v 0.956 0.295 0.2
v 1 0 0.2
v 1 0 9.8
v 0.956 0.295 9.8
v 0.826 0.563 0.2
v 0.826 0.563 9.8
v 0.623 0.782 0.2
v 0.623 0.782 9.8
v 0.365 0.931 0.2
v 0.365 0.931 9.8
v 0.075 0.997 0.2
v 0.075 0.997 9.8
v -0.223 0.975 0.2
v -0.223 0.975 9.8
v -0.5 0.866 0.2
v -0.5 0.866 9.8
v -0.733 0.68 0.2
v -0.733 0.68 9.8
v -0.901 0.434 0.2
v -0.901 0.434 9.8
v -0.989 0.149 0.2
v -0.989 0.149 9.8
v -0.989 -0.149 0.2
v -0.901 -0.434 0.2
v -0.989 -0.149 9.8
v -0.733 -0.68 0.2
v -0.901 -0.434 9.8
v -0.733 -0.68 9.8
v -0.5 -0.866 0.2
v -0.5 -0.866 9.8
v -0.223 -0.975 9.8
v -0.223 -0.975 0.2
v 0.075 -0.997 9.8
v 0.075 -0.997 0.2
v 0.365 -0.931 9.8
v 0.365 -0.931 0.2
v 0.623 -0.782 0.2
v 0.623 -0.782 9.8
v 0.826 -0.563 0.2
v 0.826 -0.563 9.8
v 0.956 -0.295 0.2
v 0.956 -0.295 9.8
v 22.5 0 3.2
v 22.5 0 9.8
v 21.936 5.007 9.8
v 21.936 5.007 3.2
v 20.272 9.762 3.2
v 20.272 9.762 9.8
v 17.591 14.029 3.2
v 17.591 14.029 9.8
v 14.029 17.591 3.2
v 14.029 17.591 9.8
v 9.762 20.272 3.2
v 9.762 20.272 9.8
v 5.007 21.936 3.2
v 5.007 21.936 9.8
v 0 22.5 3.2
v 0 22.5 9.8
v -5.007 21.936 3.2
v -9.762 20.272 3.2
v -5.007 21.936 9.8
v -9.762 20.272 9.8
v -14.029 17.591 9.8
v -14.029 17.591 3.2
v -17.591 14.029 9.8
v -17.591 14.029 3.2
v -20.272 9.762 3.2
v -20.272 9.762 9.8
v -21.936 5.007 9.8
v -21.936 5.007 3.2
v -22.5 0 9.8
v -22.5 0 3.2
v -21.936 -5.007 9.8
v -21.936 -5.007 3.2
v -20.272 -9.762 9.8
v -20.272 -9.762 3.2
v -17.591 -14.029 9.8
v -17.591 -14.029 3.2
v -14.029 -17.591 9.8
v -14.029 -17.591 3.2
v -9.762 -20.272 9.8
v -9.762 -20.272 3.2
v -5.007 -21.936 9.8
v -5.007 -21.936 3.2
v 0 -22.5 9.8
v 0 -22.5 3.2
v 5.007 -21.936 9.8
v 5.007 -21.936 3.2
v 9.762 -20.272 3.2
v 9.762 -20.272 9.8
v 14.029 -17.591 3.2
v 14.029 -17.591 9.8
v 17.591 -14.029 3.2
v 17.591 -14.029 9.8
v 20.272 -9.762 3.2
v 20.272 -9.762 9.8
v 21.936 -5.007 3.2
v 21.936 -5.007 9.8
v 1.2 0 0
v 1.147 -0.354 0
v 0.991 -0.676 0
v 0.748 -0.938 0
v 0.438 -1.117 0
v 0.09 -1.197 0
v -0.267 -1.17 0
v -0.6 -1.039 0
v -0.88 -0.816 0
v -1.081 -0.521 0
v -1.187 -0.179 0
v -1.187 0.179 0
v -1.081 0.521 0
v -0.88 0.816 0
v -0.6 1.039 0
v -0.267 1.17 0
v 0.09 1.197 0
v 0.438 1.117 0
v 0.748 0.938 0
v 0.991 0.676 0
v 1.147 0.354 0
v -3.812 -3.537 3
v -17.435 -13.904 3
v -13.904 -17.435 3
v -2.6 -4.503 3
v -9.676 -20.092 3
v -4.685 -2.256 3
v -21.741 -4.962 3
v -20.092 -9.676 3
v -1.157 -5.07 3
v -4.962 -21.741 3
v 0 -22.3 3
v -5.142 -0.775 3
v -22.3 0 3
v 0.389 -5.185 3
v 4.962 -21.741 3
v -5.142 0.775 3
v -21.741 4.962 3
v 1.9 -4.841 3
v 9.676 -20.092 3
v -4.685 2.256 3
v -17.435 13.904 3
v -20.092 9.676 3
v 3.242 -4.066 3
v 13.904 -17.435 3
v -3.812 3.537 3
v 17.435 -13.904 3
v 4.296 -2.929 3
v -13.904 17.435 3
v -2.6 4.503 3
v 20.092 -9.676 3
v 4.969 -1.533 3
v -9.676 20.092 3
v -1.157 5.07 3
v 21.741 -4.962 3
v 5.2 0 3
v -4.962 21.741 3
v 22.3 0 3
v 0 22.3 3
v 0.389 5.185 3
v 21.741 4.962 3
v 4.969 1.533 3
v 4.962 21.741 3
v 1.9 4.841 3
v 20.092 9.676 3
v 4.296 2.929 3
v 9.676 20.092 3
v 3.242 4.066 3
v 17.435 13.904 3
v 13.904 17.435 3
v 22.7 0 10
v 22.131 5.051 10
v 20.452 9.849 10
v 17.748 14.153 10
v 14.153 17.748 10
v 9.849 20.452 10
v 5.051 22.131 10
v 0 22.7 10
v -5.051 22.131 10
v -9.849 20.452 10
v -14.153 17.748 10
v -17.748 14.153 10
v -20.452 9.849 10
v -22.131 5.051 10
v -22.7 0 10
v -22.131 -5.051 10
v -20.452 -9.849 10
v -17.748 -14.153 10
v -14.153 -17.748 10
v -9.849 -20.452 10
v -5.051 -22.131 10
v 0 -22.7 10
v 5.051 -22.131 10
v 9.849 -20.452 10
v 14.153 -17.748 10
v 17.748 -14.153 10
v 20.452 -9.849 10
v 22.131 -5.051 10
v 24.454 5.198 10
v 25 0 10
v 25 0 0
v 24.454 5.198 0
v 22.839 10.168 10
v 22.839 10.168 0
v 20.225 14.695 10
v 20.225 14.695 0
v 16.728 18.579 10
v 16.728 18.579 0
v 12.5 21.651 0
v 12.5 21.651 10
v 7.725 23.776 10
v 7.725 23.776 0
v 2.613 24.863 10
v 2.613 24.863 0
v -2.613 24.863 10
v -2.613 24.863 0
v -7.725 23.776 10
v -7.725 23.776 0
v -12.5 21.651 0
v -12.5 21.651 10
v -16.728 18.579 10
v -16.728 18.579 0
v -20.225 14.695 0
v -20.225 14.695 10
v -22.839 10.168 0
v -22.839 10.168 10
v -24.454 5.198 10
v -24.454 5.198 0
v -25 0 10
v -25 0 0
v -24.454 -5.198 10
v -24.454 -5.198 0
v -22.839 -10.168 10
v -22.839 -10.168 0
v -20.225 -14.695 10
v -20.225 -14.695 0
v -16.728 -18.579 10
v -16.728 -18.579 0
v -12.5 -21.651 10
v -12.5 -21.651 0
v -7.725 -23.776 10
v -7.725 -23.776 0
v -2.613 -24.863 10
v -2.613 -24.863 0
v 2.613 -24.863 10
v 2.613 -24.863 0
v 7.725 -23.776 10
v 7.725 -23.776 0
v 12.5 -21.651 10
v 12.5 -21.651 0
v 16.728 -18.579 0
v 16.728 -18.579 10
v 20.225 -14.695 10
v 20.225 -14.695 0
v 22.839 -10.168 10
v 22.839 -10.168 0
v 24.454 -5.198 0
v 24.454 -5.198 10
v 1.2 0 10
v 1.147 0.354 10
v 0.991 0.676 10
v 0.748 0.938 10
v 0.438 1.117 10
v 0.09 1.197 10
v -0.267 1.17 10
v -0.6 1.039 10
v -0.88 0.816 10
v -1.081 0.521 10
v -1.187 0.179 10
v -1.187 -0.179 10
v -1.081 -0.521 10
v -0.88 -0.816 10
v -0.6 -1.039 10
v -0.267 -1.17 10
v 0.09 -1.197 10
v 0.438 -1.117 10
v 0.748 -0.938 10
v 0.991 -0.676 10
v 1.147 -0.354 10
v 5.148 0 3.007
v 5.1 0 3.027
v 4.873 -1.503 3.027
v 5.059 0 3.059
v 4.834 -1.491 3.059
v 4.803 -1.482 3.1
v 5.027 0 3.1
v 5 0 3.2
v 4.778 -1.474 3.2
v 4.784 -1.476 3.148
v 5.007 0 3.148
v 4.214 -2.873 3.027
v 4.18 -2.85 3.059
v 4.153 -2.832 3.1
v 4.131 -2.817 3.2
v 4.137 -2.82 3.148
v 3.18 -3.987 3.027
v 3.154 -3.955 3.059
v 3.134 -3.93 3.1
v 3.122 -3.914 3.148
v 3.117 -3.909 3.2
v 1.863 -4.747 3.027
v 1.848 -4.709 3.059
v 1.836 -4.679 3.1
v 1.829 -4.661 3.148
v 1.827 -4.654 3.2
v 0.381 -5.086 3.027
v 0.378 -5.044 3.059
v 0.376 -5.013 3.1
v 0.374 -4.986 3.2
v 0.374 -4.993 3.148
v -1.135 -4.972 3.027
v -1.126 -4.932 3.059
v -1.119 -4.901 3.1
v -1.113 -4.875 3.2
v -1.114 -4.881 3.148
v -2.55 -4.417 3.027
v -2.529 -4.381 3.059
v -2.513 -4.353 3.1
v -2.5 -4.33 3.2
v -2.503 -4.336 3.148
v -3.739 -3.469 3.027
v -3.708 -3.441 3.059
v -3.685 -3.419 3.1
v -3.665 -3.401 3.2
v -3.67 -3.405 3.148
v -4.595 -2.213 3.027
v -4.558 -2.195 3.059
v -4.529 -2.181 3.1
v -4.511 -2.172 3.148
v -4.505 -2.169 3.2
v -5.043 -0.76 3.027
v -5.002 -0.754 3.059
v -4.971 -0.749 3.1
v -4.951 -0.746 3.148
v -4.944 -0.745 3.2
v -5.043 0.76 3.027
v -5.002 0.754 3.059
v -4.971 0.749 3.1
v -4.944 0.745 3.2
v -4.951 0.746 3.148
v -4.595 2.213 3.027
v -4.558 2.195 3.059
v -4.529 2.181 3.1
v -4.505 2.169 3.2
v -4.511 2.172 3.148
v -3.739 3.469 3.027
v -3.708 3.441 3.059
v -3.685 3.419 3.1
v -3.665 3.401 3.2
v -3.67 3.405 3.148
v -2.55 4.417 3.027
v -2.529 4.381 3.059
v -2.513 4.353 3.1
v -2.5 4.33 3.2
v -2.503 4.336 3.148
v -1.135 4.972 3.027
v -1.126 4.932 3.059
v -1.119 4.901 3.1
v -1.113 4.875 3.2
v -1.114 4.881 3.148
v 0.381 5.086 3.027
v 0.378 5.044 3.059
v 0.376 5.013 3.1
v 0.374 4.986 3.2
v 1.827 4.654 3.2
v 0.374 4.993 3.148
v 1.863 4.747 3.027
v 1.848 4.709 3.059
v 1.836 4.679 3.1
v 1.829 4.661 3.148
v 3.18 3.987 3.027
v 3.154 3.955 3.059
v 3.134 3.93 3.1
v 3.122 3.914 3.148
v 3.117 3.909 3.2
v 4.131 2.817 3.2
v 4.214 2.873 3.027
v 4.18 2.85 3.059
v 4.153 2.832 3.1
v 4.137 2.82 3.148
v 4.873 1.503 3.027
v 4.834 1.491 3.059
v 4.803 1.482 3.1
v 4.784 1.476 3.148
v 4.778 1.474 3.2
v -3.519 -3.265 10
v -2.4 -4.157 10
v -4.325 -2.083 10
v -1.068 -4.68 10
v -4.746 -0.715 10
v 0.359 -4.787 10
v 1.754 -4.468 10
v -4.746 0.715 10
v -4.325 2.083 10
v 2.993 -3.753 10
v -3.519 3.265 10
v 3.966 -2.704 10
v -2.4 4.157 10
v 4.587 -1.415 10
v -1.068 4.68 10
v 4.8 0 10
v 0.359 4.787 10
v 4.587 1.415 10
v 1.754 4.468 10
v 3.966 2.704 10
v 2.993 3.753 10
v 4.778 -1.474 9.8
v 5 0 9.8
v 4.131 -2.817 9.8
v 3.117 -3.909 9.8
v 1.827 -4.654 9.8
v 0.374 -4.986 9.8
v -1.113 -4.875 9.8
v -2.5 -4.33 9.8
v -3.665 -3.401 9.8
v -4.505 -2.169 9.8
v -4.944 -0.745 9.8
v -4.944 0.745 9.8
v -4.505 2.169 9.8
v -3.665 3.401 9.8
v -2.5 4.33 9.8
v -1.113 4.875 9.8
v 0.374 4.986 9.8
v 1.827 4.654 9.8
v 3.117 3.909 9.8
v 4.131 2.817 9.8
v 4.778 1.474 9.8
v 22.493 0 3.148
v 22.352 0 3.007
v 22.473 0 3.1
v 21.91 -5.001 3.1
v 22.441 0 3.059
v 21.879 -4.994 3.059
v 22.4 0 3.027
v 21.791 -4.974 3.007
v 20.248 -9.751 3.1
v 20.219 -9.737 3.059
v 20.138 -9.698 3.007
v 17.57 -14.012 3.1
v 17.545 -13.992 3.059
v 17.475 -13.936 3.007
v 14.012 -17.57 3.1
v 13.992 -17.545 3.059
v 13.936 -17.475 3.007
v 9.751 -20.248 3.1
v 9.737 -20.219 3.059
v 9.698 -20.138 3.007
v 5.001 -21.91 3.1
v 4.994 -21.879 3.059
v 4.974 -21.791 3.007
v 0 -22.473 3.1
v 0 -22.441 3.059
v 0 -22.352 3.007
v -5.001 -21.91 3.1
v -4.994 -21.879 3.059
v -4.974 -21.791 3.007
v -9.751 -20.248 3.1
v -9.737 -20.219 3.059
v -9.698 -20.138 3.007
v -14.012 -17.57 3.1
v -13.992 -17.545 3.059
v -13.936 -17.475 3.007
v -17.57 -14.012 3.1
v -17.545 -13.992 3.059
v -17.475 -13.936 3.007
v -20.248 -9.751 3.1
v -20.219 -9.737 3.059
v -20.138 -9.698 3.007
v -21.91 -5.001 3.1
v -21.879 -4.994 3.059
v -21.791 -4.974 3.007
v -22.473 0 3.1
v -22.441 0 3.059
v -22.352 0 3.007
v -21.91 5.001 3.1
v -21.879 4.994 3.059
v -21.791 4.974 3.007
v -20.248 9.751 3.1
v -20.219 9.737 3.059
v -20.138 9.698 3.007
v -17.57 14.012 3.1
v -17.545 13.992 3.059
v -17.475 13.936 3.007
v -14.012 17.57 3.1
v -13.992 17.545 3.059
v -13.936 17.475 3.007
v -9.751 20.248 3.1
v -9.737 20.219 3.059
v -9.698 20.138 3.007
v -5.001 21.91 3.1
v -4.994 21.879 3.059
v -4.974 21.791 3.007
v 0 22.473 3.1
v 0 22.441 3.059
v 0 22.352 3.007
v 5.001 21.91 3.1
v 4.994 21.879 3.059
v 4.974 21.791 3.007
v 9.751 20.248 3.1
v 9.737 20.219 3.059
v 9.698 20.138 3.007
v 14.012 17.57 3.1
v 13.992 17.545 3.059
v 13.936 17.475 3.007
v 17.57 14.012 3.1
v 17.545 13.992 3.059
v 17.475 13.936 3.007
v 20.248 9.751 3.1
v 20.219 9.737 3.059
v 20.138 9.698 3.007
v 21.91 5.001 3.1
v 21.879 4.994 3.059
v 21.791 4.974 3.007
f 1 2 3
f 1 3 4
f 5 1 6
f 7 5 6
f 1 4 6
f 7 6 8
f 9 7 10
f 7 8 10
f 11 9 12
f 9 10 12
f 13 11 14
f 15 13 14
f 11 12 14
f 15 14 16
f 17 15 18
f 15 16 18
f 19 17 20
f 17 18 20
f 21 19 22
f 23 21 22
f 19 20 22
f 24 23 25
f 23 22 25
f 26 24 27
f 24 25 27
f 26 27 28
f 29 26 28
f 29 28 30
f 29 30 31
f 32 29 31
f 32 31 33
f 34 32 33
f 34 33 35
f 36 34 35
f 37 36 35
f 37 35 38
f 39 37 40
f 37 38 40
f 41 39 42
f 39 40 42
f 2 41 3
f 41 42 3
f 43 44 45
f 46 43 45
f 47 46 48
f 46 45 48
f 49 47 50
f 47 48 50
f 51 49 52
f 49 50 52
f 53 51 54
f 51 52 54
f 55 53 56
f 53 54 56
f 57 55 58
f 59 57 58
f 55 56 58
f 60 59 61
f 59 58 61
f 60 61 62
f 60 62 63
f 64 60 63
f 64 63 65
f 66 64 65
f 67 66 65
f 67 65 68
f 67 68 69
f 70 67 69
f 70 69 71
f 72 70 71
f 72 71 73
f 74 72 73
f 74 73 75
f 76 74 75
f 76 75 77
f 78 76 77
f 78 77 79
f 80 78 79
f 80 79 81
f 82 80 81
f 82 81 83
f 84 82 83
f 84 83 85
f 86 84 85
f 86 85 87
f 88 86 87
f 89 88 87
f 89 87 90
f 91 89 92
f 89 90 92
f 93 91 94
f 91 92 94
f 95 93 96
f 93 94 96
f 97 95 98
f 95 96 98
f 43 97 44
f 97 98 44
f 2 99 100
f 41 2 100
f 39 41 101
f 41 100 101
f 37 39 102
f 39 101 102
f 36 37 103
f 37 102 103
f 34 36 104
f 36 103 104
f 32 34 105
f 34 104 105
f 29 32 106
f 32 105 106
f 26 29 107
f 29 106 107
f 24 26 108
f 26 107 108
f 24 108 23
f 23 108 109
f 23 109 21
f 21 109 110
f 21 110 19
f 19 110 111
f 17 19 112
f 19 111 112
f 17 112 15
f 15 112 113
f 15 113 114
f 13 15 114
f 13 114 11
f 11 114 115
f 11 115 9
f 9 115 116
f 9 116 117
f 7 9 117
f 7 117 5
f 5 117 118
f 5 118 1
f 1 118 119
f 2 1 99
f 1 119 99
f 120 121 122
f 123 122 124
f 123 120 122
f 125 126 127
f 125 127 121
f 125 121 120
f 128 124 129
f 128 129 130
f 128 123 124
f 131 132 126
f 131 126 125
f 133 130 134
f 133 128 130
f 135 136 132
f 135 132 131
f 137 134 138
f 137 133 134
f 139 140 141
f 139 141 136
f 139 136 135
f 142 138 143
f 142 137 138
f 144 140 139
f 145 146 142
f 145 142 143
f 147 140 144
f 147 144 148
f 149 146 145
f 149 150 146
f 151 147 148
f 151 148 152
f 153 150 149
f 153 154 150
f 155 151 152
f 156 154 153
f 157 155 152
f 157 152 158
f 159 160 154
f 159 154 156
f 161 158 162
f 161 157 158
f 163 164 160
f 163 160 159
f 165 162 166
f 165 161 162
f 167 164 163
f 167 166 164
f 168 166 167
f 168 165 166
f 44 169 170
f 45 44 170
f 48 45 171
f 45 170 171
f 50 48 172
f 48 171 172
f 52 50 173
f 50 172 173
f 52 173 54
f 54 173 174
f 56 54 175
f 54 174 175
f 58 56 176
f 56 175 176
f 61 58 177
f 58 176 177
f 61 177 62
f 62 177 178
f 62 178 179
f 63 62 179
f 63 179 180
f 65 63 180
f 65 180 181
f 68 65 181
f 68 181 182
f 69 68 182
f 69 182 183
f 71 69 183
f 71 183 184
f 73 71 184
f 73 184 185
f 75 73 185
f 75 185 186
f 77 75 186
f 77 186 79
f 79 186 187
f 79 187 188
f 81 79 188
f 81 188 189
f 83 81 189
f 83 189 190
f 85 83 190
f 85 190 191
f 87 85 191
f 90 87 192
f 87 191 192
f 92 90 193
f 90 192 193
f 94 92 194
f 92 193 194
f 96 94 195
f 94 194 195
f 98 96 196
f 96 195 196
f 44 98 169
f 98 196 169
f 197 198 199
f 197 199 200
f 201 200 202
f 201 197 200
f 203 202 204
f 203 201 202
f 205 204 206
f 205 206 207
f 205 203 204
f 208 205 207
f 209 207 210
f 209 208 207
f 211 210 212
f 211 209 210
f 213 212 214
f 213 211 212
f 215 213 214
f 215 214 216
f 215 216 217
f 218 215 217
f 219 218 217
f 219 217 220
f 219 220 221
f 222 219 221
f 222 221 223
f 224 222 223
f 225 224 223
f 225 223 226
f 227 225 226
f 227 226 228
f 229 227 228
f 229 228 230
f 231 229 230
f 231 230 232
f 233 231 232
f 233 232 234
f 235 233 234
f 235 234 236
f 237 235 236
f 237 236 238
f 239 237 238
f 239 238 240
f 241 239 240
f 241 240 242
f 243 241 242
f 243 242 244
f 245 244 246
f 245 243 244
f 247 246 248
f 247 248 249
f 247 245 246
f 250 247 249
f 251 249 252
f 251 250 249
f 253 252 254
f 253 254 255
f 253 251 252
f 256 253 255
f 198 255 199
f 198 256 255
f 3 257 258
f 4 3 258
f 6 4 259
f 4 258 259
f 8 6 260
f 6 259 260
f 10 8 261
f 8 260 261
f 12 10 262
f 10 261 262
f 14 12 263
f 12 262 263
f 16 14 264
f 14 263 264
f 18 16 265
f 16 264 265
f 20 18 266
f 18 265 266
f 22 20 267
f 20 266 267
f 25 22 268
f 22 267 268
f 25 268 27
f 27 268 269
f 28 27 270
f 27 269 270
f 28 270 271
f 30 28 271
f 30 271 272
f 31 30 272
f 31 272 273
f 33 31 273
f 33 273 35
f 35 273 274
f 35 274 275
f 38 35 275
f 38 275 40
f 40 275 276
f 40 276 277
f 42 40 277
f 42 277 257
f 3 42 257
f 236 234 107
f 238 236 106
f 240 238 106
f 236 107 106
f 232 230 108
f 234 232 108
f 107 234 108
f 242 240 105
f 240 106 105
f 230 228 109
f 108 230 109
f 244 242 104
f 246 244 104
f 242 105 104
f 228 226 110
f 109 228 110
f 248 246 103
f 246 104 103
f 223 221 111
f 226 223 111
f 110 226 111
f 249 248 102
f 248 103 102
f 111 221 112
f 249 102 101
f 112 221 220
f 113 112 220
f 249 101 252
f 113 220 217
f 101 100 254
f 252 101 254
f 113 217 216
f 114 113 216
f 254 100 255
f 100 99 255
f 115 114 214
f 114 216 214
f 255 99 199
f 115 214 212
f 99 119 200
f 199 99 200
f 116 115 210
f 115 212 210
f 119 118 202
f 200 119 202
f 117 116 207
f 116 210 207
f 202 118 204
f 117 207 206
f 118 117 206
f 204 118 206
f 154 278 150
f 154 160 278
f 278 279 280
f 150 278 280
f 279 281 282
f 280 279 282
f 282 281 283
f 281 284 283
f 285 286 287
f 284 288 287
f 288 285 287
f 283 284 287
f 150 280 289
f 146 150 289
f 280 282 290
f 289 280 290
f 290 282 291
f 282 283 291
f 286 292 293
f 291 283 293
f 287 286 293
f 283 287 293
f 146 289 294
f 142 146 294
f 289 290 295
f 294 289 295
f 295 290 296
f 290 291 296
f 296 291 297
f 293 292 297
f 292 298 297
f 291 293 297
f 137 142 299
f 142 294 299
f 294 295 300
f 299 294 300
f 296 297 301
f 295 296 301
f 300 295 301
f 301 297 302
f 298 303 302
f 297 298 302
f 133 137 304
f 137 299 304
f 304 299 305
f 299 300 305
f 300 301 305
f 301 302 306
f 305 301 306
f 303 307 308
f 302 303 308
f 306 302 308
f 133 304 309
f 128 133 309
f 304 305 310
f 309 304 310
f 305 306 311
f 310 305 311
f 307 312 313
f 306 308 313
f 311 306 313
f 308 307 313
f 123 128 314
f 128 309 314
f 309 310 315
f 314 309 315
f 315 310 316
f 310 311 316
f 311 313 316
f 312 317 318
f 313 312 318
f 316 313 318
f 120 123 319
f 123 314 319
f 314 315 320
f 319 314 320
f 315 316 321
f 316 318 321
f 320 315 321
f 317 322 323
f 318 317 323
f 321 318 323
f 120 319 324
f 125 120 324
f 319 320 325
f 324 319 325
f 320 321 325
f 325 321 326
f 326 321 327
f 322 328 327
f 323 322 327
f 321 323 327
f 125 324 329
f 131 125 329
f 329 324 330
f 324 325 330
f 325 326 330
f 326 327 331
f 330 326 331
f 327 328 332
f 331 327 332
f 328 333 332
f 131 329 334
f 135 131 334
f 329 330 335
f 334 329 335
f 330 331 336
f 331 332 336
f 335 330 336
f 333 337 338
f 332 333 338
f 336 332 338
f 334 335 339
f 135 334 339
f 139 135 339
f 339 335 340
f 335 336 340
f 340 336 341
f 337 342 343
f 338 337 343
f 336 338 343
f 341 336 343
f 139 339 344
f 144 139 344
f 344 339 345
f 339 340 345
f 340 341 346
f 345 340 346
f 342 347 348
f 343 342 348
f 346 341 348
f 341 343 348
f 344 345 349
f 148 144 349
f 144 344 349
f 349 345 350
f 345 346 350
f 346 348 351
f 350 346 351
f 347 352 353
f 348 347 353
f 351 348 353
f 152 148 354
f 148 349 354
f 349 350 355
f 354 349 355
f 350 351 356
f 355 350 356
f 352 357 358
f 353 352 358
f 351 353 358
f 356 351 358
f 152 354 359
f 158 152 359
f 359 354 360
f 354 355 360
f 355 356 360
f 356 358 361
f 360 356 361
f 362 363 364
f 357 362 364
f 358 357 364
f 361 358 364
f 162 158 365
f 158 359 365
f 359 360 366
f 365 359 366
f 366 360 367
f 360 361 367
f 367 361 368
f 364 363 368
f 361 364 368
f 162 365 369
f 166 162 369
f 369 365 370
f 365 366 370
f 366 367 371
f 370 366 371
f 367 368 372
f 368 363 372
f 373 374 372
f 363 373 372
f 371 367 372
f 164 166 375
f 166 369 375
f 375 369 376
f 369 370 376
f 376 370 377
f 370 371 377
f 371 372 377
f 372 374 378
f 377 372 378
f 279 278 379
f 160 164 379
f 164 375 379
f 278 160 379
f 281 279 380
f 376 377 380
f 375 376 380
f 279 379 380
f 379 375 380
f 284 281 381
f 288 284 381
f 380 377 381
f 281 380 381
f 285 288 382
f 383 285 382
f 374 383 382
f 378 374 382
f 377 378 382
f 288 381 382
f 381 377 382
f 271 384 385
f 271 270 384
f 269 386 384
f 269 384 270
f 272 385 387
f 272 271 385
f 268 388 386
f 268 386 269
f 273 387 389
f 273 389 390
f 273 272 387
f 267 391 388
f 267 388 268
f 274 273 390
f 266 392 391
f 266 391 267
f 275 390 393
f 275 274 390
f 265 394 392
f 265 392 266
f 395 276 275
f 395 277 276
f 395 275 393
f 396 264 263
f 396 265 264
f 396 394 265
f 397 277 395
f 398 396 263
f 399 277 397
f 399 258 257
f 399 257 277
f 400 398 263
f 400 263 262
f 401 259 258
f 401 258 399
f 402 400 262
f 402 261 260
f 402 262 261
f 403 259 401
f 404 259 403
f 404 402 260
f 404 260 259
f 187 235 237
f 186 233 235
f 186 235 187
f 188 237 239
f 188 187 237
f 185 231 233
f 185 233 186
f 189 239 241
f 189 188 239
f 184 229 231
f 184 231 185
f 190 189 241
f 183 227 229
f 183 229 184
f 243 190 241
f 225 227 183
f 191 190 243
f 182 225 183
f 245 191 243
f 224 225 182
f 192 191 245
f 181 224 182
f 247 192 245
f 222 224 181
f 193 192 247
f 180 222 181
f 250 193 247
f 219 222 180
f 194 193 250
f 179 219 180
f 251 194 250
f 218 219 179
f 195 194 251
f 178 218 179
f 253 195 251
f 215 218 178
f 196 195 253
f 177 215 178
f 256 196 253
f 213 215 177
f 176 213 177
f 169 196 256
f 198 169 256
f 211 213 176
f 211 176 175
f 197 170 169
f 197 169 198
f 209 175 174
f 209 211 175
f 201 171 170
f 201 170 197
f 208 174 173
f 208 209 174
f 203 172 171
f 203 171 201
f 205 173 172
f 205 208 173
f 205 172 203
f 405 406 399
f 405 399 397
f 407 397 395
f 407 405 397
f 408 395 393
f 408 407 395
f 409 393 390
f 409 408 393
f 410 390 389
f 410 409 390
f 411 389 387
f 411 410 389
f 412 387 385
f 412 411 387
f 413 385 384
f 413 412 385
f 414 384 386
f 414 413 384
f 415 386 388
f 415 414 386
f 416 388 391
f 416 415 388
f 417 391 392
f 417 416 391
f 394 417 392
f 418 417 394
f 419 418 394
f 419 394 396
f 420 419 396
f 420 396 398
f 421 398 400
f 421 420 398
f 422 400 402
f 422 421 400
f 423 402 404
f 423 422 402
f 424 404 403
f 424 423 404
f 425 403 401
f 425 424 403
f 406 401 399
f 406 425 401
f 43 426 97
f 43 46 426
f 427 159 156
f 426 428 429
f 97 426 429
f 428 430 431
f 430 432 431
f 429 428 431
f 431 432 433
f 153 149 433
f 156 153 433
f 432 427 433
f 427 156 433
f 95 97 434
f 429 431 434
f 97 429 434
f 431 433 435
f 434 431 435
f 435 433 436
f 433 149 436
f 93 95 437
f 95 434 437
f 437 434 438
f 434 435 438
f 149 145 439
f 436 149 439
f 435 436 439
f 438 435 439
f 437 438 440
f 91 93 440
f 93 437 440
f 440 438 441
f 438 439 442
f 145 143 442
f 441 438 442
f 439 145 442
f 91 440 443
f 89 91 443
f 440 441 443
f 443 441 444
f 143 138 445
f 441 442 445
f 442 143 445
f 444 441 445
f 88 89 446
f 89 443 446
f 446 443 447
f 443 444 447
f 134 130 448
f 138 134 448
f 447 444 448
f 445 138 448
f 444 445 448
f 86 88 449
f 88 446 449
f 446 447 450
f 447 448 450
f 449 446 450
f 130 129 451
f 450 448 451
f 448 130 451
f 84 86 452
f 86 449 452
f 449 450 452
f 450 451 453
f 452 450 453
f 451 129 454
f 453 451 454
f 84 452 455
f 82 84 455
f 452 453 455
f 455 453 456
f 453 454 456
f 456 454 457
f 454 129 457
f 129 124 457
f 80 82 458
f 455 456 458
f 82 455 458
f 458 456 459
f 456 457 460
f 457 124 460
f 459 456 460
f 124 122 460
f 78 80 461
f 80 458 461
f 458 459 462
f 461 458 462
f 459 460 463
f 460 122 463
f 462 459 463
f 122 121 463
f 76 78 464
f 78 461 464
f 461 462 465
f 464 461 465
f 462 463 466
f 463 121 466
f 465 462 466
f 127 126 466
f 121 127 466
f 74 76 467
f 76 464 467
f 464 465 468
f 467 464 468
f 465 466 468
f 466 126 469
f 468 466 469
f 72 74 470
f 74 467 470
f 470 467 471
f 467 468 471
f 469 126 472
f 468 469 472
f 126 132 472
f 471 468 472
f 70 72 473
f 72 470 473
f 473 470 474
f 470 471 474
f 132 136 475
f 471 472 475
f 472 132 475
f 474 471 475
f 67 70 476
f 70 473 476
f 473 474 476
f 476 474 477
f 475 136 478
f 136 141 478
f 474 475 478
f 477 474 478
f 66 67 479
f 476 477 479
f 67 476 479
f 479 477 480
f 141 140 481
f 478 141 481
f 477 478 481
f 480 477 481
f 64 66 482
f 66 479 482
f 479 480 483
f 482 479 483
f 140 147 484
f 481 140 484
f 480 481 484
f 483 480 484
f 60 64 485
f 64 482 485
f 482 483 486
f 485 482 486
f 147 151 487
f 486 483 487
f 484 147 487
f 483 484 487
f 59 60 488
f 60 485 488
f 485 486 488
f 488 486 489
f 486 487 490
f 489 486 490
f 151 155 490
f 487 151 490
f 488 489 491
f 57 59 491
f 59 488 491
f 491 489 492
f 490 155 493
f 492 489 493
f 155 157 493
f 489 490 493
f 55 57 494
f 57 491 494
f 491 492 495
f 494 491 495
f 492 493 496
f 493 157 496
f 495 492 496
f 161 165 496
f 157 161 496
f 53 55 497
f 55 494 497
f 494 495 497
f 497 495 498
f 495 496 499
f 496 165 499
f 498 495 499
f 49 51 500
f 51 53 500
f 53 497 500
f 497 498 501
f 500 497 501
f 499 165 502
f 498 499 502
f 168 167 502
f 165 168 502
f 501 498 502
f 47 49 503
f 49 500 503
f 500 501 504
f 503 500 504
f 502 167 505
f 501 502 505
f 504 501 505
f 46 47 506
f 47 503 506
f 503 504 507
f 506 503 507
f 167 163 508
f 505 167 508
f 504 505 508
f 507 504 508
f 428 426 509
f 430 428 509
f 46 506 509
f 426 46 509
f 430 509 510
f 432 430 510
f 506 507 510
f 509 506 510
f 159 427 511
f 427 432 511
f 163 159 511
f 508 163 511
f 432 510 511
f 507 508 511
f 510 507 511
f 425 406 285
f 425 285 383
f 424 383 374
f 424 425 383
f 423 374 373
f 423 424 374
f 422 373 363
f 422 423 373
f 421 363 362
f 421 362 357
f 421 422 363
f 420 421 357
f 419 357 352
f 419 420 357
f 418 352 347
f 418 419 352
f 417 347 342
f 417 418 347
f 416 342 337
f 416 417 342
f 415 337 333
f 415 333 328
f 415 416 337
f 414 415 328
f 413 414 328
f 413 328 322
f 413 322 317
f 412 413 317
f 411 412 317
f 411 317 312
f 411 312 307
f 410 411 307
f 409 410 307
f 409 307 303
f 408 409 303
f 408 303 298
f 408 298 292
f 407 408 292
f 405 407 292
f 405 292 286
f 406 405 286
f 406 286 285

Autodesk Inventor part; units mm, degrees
ref_plane "YZ Plane" through (0, 0, 0) normal (1, 0, 0) x (0, 1, 0)
ref_plane "XZ Plane" through (0, 0, 0) normal (0, 1, 0) x (-1, 0, 0)
ref_plane "XY Plane" through (0, 0, 0) normal (0, 0, 1) x (1, 0, 0)
sketch "Skizze1" plane through (0, 0, 0) normal (0, 0, 1) x (1, 0, 0)
  circle A0 centre (0, 0) radius 30
  dimension "d0" = 60
extrude "Extrusion1" add sketch "Skizze1" along normal blind 10
sketch "Skizze2" plane through (0, 0, 10) normal (0, 0, 1) x (1, 0, 0)
  circle A0 centre (0, 0) radius 30 projected
  circle A1 centre (0, 0) radius 22.5
  circle A2 centre (0, 0) radius 5
  dimension "d3" = 7.5
  dimension "d4" = 10
extrude "Extrusion2" cut sketch "Skizze2" against normal blind 7 contours A1
sketch "Skizze3" plane through (0, 0, 10) normal (0, 0, 1) x (1, 0, 0)
  circle A0 centre (0, 0) radius 1
  dimension "d7" = 2
extrude "Extrusion3" cut sketch "Skizze3" along normal through all both and the other way through all
fillet "Rundung1" radius 0.2 2 edges at (-22.5, 0, 3) (-5, 0, 3)
chamfer "Fase1" distance 0.2 angle 45 6 edges at (-30, 0, 0) (-30, 0, 10) (-22.5, 0, 10) (-5, 0, 10) (-1, 0, 10) (-1, 0, 0)
sketch "Skizze4" plane through (0, 0, 10) normal (0, 0, 1) x (1, 0, 0)
  circle A0 centre (0, 0) radius 25
  circle A1 centre (0, 0) radius 40
  dimension "d14" = 50
  dimension "d15" = 15
extrude "Extrusion4" cut sketch "Skizze4" along normal through all both and the other way through all
sketch "Skizze5" plane through (0, 0, 10) normal (0, 0, 1) x (1, 0, 0)
  circle A0 centre (0, 0) radius 1.2 projected
  circle A1 centre (0, 0) radius 27.5
  circle A2 centre (0, 0) radius 30
  dimension "d18" = 55
  dimension "d19" = 60
properties part number "felge" material "Aluminium 6061"
